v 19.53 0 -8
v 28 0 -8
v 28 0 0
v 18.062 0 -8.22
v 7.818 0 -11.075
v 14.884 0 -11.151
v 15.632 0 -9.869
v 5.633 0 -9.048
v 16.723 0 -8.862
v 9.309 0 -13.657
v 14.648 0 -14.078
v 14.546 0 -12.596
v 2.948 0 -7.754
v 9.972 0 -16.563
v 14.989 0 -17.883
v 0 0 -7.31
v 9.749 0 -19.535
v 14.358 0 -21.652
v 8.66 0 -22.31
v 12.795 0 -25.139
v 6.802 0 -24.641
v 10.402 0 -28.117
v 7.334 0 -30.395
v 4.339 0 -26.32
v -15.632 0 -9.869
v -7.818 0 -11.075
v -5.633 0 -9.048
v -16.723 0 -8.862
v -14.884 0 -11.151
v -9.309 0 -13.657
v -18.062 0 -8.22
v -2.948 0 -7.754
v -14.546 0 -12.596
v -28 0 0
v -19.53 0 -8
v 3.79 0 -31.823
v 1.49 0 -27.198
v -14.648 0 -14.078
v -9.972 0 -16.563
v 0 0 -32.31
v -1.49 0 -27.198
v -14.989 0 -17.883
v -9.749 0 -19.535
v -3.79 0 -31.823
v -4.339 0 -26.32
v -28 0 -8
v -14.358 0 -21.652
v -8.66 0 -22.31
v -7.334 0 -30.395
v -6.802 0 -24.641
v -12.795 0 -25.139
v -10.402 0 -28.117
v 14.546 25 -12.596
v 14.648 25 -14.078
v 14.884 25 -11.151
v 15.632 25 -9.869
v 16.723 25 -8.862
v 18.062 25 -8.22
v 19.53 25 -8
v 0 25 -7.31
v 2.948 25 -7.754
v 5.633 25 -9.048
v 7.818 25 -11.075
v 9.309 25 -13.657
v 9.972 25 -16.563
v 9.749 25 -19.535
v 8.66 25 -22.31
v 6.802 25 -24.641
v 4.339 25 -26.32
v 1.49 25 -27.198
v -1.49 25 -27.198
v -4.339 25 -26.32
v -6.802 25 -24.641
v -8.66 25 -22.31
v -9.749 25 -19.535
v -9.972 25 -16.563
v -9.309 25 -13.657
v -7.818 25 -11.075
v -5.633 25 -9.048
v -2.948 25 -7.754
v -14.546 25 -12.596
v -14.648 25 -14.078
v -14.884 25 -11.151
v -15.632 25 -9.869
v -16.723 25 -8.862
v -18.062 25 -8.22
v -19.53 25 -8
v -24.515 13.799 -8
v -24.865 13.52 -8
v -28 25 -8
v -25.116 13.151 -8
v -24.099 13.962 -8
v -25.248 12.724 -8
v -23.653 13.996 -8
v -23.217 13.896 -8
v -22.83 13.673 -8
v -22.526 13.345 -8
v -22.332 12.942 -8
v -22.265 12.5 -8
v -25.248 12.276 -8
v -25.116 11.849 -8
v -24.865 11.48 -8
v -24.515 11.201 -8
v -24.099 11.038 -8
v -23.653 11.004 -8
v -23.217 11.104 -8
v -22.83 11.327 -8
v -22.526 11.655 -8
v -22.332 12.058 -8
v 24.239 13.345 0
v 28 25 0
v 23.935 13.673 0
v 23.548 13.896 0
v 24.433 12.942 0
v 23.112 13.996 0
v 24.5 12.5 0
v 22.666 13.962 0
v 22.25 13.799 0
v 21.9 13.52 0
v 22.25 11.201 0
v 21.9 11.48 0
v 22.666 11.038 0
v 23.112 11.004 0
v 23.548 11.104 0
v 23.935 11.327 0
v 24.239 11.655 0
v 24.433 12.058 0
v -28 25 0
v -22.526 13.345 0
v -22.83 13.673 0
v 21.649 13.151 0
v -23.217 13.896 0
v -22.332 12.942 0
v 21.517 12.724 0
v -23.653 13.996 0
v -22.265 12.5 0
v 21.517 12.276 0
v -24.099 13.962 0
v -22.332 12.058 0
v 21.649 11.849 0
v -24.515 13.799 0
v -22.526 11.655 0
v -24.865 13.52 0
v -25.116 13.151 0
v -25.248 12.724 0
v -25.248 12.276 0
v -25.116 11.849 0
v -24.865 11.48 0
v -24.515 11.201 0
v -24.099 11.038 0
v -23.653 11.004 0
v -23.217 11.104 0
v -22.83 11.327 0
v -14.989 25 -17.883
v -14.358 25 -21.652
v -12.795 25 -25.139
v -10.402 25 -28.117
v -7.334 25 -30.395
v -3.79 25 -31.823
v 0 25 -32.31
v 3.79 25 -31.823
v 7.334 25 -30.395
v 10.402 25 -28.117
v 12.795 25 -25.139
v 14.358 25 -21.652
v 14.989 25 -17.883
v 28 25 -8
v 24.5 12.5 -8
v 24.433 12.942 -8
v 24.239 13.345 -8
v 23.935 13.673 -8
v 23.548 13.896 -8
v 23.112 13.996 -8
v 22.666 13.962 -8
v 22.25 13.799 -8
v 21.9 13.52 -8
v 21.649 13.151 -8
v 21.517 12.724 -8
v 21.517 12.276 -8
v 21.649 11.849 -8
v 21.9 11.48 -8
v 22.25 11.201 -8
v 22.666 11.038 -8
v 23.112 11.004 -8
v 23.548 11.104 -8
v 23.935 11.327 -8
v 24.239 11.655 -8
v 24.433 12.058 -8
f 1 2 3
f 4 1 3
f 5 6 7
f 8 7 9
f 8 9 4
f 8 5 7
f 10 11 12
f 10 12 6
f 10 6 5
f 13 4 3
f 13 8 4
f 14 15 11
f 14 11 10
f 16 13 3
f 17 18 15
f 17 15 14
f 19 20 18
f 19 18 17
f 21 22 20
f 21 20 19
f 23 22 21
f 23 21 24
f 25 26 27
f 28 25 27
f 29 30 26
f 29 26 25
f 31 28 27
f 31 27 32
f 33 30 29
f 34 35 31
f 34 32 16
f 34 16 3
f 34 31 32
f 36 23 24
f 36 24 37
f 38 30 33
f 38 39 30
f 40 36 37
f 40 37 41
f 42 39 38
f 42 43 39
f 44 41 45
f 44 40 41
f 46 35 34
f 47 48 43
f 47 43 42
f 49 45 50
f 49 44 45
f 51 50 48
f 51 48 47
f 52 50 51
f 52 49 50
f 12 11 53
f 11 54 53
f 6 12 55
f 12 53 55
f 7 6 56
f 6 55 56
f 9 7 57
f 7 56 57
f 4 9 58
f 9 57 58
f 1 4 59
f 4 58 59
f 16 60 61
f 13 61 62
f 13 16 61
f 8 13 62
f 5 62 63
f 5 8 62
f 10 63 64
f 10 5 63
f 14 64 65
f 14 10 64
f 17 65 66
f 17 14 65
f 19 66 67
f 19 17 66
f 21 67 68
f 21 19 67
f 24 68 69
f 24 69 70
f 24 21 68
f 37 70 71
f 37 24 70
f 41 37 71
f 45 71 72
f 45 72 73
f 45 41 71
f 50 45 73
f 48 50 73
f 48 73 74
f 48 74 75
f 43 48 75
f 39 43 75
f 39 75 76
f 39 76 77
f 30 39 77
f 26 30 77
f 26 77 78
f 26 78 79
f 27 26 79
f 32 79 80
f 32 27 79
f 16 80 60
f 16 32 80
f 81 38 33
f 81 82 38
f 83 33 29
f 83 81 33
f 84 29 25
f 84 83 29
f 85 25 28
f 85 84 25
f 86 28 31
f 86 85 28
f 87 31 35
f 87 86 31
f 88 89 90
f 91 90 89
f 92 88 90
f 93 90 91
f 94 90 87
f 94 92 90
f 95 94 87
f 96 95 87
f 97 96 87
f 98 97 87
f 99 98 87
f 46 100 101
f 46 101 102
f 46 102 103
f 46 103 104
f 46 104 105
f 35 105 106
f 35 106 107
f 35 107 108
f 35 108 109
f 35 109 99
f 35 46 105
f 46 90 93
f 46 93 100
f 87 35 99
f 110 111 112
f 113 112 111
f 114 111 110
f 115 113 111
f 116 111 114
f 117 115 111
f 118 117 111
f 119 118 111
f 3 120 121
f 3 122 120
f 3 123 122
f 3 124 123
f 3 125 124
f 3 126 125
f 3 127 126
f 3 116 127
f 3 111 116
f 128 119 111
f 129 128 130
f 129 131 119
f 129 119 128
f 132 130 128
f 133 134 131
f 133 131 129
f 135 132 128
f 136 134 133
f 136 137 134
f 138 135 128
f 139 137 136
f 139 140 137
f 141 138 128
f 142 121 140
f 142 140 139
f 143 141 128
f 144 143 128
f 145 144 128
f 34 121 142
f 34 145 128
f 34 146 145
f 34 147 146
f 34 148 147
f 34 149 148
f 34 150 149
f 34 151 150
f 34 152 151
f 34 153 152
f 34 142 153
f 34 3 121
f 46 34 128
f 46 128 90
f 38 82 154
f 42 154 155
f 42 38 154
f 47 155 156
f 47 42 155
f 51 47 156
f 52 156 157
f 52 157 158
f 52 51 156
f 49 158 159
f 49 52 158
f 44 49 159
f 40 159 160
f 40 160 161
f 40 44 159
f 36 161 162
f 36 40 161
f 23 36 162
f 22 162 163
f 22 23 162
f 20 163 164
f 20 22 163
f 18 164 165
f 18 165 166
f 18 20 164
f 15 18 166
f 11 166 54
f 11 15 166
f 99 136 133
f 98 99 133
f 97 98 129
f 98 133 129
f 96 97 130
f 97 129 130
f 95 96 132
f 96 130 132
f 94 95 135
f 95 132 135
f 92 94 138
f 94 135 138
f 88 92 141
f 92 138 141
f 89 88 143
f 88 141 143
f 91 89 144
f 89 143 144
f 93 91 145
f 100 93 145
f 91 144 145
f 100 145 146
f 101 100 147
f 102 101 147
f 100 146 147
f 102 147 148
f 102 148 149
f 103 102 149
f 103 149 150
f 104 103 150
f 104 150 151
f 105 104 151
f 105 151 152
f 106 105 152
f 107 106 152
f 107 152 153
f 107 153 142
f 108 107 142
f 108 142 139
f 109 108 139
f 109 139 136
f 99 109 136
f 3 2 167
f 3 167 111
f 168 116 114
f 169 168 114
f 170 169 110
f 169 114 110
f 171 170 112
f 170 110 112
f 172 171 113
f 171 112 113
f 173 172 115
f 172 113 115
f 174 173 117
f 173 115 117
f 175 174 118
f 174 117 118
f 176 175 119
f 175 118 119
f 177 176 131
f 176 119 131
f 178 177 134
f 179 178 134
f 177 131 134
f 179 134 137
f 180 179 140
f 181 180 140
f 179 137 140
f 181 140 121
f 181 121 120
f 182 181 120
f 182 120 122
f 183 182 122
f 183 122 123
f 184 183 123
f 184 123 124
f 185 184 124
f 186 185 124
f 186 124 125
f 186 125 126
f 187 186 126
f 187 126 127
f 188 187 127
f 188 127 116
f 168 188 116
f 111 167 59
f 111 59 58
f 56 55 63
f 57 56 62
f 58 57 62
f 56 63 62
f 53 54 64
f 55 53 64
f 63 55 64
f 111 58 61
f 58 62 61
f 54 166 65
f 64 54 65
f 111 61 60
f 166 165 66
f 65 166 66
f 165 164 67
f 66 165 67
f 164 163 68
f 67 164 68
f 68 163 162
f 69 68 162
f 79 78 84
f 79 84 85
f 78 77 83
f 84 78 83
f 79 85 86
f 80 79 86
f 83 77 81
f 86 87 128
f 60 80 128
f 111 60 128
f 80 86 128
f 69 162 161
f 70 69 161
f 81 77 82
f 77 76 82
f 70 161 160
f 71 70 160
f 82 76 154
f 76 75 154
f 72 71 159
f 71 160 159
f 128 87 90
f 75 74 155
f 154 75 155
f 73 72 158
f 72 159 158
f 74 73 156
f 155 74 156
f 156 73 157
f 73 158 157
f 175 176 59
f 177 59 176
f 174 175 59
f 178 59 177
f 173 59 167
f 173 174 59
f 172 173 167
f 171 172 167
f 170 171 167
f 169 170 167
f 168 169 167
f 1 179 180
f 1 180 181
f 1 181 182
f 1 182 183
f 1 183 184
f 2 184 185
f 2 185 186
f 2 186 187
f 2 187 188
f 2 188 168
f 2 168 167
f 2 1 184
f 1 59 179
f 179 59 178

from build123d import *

# Parameters (mm, degrees)
SKETCH1_R                 = 10
BOSS_EXTRUDE1_DEPTH       = 25
FILLET2_R                 = 5
FILLET3_R                 = 5
F_3_0MM_DOWEL_HOLE1_D     = 3
F_3_0MM_DOWEL_HOLE1_DEPTH = 12.4
F_3_0MM_DOWEL_HOLE1_TIP   = 0.901290929


with BuildPart() as part:
    # Sketch1 → Boss-Extrude1 (new body)
    with BuildSketch(Plane(origin=(0, 0, 0), x_dir=(1, 0, 0), z_dir=(0, 1, 0))):
        with BuildLine():
            Line((0, 0), (-28, 0))
            Line((-28, 0), (-28, 8))
            Line((-28, 8), (-11.761010247, 8))
            ThreePointArc((-11.761010247, 8), (0, 32.310136302), (11.761010247, 8))
            Line((11.761010247, 8), (28, 8))
            Line((28, 8), (28, 0))
            Line((28, 0), (0, 0))
        make_face()
        with Locations(Location((0, 17.310136302, 0), (0, 0, 270))):
            Circle(SKETCH1_R, mode=Mode.SUBTRACT)
    extrude(amount=BOSS_EXTRUDE1_DEPTH)

    # Fillet2
    fillet2_edges = [part.edges().sort_by_distance(p)[0] for p in [
        (11.761010247, 12.5, -8),
    ]]
    fillet(fillet2_edges, radius=FILLET2_R)

    # Fillet3
    fillet3_edges = [part.edges().sort_by_distance(p)[0] for p in [
        (-11.761010247, 12.5, -8),
    ]]
    fillet(fillet3_edges, radius=FILLET3_R)

    # Ø3.0mm Dowel Hole1
    with Locations(Plane(origin=(23, 12.5, -8), x_dir=(-1, 0, 0), z_dir=(0, 0, -1))):
        with Locations((0, 0), (46.765023362, 0)):
            Hole(F_3_0MM_DOWEL_HOLE1_D / 2, depth=F_3_0MM_DOWEL_HOLE1_DEPTH)
            with Locations((0, 0, -(F_3_0MM_DOWEL_HOLE1_DEPTH + F_3_0MM_DOWEL_HOLE1_TIP / 2))):  # 118° drill point
                Cone(0, F_3_0MM_DOWEL_HOLE1_D / 2, F_3_0MM_DOWEL_HOLE1_TIP, mode=Mode.SUBTRACT)


solid = part.part
